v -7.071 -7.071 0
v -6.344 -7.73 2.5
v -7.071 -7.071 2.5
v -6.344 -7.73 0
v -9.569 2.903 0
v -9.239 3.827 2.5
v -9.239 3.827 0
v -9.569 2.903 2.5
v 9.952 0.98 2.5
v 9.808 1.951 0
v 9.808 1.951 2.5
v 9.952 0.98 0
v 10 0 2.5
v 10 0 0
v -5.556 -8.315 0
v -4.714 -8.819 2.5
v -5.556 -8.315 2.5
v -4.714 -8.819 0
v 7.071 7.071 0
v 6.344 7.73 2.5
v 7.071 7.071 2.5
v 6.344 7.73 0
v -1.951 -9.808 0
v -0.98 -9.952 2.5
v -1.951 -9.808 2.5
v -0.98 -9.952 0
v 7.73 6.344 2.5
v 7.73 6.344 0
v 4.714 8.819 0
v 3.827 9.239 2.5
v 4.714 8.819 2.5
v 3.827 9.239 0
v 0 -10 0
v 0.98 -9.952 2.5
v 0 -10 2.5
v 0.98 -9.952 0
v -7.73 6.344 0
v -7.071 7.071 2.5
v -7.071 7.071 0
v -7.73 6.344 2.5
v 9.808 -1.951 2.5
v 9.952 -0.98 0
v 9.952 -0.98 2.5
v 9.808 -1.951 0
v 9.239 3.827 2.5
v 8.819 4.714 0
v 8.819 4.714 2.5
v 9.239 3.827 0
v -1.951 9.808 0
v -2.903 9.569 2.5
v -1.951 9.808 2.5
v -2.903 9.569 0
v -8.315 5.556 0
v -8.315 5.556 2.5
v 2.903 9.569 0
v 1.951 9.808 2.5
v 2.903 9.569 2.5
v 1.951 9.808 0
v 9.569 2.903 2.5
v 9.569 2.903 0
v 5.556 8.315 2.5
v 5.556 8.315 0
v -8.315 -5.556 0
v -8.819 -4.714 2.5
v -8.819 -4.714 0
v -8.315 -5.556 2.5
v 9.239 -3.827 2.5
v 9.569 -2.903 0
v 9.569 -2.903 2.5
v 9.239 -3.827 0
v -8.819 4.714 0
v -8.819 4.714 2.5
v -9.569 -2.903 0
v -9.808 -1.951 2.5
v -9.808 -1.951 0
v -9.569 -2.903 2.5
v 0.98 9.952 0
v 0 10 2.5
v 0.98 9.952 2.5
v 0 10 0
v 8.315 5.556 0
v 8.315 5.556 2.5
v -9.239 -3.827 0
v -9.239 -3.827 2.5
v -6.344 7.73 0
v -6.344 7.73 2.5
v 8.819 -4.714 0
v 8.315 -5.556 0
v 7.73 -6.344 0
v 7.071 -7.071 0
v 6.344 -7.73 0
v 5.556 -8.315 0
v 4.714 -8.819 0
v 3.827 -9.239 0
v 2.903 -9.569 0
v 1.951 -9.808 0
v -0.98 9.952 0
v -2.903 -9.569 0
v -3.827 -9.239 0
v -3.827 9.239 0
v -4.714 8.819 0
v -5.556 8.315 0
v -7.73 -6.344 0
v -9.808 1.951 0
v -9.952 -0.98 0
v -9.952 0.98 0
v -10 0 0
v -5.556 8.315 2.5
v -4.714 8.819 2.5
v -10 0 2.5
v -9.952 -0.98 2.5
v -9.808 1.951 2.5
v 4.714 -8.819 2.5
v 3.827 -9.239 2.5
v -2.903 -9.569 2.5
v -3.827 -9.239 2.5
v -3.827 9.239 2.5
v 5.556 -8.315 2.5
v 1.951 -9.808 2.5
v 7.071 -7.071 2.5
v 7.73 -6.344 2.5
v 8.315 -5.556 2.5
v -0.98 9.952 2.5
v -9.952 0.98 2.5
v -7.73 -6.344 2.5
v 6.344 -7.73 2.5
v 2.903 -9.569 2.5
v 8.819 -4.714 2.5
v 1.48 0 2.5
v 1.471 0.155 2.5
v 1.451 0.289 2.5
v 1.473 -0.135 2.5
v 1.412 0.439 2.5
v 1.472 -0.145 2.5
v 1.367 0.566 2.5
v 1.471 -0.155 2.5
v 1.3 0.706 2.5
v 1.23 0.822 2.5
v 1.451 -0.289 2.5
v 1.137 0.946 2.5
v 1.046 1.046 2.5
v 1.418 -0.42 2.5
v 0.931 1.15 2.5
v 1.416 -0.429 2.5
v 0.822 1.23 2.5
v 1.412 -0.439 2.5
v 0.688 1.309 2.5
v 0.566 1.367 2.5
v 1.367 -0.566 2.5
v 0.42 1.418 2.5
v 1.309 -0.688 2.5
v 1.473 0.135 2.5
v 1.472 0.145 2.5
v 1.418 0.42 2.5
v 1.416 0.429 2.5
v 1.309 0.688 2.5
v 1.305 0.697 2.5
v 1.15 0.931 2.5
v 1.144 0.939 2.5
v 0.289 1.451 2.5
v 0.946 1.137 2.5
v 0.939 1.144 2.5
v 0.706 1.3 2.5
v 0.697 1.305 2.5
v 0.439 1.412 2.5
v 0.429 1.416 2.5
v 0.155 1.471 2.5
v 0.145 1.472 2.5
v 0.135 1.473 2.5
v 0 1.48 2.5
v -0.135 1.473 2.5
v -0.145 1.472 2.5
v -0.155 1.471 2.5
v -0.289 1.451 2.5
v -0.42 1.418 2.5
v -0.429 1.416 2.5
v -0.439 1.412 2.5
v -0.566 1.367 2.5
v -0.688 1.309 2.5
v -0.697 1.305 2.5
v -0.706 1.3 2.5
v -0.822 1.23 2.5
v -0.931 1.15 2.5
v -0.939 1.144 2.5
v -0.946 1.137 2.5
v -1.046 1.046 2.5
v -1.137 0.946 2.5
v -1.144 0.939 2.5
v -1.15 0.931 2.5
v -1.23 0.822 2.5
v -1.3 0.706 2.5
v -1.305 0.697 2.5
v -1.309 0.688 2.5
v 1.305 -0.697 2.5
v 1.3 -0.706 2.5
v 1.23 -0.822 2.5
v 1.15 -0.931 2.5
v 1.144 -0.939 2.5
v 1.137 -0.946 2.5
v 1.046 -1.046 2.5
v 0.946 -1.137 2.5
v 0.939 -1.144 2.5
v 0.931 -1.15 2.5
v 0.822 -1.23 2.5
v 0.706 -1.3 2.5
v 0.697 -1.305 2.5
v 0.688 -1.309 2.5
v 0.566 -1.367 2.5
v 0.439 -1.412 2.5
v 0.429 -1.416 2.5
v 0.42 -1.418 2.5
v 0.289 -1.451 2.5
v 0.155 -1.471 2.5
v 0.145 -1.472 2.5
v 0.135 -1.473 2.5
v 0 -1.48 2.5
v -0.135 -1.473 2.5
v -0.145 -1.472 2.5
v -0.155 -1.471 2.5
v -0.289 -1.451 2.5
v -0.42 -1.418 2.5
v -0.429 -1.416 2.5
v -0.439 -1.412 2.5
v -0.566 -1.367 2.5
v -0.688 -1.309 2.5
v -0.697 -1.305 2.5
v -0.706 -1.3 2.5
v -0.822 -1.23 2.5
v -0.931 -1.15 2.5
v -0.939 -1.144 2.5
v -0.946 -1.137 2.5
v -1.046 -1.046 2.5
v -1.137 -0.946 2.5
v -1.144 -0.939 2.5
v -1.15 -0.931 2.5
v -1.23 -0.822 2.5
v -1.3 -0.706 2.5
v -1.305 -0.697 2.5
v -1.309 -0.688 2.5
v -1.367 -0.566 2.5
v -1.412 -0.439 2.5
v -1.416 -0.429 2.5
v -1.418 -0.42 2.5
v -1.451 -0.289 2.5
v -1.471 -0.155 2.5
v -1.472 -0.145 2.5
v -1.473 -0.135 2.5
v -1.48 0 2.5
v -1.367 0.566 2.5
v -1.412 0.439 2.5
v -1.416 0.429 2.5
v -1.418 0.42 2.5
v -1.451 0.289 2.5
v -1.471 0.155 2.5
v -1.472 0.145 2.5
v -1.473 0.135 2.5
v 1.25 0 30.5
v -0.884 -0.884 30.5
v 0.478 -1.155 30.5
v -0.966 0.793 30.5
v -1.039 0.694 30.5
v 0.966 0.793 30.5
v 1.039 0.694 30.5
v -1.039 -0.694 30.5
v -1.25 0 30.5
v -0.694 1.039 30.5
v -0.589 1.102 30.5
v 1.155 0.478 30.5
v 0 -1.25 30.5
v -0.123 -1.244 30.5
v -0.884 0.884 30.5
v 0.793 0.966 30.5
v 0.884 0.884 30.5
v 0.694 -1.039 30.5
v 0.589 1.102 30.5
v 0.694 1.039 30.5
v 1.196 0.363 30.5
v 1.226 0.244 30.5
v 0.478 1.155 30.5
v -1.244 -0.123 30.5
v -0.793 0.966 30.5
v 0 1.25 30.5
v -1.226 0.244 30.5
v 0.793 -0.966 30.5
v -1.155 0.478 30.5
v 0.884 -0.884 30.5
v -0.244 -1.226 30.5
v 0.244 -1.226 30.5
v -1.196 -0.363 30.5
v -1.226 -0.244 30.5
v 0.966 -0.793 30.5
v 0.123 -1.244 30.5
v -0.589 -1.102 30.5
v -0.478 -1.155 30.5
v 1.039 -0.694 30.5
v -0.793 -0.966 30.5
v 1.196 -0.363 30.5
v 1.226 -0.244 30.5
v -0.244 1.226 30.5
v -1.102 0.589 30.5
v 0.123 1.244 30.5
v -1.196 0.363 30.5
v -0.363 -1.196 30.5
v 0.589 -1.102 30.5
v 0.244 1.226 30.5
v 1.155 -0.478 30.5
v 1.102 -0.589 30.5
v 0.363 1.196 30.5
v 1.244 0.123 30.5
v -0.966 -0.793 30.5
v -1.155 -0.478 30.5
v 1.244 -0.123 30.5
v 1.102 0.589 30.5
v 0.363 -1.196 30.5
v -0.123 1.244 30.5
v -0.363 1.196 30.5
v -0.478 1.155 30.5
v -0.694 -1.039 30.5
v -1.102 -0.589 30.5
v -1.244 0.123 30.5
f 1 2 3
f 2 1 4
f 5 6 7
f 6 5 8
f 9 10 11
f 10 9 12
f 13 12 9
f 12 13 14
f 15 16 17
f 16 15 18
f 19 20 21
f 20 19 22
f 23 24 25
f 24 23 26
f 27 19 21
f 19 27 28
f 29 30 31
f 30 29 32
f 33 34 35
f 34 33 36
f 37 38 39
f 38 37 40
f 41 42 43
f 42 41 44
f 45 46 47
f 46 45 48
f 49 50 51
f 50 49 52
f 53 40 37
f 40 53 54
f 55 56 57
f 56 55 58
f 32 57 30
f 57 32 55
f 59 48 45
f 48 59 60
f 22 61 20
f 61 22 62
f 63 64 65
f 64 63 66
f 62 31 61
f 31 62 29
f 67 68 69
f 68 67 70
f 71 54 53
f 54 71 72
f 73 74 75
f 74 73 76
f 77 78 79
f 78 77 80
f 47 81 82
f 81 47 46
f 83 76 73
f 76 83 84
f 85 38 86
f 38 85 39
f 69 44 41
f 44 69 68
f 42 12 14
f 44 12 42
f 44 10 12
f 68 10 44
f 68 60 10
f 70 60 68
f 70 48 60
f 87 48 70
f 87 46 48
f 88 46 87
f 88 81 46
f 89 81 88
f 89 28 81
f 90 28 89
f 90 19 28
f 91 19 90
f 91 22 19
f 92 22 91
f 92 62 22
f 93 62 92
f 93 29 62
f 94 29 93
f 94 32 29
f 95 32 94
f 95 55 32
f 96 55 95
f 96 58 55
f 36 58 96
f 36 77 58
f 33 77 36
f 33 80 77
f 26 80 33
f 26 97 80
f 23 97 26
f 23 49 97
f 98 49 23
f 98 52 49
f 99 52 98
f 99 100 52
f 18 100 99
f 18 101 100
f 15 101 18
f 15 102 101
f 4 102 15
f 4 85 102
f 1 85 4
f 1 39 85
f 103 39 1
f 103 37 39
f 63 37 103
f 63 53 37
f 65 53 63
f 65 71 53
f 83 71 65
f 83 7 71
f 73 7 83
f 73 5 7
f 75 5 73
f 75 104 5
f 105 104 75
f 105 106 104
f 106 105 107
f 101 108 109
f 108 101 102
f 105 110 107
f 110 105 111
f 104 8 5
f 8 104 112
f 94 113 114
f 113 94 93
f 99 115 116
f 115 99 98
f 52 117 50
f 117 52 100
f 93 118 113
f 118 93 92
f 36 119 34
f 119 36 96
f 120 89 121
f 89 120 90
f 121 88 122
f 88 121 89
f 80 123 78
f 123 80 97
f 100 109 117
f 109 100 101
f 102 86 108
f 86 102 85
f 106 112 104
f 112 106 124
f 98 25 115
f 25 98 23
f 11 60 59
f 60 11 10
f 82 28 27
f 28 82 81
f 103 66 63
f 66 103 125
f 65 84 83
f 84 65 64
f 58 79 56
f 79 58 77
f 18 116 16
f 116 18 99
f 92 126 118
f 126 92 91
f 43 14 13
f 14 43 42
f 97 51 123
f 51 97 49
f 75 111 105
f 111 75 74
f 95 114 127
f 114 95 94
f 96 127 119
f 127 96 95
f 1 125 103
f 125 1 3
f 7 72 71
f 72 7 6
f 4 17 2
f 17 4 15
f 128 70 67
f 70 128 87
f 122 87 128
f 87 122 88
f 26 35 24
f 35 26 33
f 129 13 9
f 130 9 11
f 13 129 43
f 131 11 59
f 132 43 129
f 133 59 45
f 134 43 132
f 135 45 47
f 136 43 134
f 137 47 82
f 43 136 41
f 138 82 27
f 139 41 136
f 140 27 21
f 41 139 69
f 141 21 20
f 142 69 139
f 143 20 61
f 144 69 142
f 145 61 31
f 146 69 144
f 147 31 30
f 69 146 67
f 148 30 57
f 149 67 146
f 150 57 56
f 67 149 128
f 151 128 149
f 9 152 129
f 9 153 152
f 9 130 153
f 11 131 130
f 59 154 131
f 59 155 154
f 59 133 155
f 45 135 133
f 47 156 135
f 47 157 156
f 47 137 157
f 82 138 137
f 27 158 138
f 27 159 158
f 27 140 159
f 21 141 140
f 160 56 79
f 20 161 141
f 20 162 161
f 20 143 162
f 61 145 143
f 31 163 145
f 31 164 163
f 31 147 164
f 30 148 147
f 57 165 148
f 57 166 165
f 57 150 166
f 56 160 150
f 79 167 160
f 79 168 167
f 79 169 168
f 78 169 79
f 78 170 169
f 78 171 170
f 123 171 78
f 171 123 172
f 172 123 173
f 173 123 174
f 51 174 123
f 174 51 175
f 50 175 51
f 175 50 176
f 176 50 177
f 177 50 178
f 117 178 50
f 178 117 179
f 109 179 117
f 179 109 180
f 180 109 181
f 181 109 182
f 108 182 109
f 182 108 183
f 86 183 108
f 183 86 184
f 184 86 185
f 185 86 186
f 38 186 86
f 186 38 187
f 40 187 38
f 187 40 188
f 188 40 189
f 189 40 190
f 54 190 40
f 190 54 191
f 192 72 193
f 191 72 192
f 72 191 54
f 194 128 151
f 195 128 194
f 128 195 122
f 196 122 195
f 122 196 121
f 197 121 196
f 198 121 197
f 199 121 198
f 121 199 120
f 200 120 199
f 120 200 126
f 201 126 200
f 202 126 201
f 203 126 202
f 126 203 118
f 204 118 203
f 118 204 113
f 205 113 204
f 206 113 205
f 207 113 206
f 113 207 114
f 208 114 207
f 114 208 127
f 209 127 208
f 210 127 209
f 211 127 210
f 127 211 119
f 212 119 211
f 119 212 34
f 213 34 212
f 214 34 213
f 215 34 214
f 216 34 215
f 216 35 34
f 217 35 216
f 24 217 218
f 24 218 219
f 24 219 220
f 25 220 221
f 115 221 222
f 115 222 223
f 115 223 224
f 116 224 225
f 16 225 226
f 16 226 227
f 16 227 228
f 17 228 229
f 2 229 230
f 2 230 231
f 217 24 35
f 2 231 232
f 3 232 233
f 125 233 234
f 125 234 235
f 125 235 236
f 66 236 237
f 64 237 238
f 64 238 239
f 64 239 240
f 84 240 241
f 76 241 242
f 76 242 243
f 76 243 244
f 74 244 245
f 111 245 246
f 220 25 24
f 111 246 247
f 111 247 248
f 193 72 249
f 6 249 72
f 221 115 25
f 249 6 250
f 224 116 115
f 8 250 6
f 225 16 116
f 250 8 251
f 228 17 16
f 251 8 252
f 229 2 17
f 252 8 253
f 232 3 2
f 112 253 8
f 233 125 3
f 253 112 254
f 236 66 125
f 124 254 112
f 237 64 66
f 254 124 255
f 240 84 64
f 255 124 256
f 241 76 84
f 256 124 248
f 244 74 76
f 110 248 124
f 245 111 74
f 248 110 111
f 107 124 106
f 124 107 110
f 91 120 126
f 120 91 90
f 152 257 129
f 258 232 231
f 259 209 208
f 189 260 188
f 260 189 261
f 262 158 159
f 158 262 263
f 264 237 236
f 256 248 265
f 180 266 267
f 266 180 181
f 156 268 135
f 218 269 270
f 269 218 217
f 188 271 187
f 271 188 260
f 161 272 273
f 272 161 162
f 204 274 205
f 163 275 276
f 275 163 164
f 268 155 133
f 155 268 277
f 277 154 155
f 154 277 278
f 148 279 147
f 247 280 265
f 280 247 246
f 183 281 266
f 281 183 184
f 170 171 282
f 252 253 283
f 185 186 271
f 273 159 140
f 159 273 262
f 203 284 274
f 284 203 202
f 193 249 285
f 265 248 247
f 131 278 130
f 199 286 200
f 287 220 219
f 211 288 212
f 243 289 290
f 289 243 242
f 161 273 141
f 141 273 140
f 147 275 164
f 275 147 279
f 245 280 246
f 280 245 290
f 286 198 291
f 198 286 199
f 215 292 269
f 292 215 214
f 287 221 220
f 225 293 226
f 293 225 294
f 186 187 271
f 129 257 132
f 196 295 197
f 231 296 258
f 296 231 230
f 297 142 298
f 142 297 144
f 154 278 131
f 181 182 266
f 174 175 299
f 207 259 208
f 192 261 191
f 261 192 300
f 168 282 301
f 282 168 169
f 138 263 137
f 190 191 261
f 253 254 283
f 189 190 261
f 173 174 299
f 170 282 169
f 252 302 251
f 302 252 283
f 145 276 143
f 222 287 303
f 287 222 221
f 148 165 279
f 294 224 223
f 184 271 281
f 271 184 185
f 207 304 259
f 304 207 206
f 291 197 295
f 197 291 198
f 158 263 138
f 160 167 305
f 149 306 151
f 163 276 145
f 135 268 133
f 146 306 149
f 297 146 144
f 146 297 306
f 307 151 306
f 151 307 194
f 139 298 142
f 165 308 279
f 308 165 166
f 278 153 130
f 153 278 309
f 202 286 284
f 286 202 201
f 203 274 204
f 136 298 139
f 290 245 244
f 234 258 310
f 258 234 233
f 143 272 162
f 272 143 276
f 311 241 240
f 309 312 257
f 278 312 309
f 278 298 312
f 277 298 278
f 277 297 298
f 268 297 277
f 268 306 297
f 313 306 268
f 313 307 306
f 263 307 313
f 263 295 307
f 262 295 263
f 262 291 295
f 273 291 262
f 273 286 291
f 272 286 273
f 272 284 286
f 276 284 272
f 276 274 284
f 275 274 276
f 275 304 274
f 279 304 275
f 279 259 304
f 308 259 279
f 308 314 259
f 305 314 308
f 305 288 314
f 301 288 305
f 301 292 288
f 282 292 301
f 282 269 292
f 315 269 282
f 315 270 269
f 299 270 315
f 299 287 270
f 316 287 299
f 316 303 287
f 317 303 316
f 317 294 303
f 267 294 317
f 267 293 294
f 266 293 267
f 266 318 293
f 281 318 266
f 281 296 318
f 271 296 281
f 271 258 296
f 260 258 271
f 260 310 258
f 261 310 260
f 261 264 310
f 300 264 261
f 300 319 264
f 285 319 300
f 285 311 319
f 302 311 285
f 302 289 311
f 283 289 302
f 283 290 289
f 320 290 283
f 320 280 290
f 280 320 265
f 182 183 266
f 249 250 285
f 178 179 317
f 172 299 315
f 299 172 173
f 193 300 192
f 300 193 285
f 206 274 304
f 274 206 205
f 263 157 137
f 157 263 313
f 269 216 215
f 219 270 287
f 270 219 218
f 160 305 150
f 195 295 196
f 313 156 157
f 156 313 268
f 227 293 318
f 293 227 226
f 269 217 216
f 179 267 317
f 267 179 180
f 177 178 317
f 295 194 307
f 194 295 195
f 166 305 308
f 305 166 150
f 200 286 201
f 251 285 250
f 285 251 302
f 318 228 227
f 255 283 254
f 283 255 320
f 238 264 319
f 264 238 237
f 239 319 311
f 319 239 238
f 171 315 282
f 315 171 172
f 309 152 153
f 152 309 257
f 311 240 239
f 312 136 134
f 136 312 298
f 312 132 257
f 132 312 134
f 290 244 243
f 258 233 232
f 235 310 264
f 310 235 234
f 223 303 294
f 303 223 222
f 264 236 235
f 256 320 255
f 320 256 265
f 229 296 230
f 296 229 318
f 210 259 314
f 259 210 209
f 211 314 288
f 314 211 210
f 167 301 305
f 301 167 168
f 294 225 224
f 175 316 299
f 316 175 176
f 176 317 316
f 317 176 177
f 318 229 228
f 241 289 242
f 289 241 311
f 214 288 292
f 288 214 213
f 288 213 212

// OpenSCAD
headDiameter = 20;
headThickness = 2.5;
tailDiameter = 2.5;
tailBigDiameter = 3;
tailLength = 28;

$fn = 64;
cylinder(d=headDiameter,h=headThickness);
cylinder(d1=tailBigDiameter,d2=tailDiameter,h=tailLength+headThickness);
